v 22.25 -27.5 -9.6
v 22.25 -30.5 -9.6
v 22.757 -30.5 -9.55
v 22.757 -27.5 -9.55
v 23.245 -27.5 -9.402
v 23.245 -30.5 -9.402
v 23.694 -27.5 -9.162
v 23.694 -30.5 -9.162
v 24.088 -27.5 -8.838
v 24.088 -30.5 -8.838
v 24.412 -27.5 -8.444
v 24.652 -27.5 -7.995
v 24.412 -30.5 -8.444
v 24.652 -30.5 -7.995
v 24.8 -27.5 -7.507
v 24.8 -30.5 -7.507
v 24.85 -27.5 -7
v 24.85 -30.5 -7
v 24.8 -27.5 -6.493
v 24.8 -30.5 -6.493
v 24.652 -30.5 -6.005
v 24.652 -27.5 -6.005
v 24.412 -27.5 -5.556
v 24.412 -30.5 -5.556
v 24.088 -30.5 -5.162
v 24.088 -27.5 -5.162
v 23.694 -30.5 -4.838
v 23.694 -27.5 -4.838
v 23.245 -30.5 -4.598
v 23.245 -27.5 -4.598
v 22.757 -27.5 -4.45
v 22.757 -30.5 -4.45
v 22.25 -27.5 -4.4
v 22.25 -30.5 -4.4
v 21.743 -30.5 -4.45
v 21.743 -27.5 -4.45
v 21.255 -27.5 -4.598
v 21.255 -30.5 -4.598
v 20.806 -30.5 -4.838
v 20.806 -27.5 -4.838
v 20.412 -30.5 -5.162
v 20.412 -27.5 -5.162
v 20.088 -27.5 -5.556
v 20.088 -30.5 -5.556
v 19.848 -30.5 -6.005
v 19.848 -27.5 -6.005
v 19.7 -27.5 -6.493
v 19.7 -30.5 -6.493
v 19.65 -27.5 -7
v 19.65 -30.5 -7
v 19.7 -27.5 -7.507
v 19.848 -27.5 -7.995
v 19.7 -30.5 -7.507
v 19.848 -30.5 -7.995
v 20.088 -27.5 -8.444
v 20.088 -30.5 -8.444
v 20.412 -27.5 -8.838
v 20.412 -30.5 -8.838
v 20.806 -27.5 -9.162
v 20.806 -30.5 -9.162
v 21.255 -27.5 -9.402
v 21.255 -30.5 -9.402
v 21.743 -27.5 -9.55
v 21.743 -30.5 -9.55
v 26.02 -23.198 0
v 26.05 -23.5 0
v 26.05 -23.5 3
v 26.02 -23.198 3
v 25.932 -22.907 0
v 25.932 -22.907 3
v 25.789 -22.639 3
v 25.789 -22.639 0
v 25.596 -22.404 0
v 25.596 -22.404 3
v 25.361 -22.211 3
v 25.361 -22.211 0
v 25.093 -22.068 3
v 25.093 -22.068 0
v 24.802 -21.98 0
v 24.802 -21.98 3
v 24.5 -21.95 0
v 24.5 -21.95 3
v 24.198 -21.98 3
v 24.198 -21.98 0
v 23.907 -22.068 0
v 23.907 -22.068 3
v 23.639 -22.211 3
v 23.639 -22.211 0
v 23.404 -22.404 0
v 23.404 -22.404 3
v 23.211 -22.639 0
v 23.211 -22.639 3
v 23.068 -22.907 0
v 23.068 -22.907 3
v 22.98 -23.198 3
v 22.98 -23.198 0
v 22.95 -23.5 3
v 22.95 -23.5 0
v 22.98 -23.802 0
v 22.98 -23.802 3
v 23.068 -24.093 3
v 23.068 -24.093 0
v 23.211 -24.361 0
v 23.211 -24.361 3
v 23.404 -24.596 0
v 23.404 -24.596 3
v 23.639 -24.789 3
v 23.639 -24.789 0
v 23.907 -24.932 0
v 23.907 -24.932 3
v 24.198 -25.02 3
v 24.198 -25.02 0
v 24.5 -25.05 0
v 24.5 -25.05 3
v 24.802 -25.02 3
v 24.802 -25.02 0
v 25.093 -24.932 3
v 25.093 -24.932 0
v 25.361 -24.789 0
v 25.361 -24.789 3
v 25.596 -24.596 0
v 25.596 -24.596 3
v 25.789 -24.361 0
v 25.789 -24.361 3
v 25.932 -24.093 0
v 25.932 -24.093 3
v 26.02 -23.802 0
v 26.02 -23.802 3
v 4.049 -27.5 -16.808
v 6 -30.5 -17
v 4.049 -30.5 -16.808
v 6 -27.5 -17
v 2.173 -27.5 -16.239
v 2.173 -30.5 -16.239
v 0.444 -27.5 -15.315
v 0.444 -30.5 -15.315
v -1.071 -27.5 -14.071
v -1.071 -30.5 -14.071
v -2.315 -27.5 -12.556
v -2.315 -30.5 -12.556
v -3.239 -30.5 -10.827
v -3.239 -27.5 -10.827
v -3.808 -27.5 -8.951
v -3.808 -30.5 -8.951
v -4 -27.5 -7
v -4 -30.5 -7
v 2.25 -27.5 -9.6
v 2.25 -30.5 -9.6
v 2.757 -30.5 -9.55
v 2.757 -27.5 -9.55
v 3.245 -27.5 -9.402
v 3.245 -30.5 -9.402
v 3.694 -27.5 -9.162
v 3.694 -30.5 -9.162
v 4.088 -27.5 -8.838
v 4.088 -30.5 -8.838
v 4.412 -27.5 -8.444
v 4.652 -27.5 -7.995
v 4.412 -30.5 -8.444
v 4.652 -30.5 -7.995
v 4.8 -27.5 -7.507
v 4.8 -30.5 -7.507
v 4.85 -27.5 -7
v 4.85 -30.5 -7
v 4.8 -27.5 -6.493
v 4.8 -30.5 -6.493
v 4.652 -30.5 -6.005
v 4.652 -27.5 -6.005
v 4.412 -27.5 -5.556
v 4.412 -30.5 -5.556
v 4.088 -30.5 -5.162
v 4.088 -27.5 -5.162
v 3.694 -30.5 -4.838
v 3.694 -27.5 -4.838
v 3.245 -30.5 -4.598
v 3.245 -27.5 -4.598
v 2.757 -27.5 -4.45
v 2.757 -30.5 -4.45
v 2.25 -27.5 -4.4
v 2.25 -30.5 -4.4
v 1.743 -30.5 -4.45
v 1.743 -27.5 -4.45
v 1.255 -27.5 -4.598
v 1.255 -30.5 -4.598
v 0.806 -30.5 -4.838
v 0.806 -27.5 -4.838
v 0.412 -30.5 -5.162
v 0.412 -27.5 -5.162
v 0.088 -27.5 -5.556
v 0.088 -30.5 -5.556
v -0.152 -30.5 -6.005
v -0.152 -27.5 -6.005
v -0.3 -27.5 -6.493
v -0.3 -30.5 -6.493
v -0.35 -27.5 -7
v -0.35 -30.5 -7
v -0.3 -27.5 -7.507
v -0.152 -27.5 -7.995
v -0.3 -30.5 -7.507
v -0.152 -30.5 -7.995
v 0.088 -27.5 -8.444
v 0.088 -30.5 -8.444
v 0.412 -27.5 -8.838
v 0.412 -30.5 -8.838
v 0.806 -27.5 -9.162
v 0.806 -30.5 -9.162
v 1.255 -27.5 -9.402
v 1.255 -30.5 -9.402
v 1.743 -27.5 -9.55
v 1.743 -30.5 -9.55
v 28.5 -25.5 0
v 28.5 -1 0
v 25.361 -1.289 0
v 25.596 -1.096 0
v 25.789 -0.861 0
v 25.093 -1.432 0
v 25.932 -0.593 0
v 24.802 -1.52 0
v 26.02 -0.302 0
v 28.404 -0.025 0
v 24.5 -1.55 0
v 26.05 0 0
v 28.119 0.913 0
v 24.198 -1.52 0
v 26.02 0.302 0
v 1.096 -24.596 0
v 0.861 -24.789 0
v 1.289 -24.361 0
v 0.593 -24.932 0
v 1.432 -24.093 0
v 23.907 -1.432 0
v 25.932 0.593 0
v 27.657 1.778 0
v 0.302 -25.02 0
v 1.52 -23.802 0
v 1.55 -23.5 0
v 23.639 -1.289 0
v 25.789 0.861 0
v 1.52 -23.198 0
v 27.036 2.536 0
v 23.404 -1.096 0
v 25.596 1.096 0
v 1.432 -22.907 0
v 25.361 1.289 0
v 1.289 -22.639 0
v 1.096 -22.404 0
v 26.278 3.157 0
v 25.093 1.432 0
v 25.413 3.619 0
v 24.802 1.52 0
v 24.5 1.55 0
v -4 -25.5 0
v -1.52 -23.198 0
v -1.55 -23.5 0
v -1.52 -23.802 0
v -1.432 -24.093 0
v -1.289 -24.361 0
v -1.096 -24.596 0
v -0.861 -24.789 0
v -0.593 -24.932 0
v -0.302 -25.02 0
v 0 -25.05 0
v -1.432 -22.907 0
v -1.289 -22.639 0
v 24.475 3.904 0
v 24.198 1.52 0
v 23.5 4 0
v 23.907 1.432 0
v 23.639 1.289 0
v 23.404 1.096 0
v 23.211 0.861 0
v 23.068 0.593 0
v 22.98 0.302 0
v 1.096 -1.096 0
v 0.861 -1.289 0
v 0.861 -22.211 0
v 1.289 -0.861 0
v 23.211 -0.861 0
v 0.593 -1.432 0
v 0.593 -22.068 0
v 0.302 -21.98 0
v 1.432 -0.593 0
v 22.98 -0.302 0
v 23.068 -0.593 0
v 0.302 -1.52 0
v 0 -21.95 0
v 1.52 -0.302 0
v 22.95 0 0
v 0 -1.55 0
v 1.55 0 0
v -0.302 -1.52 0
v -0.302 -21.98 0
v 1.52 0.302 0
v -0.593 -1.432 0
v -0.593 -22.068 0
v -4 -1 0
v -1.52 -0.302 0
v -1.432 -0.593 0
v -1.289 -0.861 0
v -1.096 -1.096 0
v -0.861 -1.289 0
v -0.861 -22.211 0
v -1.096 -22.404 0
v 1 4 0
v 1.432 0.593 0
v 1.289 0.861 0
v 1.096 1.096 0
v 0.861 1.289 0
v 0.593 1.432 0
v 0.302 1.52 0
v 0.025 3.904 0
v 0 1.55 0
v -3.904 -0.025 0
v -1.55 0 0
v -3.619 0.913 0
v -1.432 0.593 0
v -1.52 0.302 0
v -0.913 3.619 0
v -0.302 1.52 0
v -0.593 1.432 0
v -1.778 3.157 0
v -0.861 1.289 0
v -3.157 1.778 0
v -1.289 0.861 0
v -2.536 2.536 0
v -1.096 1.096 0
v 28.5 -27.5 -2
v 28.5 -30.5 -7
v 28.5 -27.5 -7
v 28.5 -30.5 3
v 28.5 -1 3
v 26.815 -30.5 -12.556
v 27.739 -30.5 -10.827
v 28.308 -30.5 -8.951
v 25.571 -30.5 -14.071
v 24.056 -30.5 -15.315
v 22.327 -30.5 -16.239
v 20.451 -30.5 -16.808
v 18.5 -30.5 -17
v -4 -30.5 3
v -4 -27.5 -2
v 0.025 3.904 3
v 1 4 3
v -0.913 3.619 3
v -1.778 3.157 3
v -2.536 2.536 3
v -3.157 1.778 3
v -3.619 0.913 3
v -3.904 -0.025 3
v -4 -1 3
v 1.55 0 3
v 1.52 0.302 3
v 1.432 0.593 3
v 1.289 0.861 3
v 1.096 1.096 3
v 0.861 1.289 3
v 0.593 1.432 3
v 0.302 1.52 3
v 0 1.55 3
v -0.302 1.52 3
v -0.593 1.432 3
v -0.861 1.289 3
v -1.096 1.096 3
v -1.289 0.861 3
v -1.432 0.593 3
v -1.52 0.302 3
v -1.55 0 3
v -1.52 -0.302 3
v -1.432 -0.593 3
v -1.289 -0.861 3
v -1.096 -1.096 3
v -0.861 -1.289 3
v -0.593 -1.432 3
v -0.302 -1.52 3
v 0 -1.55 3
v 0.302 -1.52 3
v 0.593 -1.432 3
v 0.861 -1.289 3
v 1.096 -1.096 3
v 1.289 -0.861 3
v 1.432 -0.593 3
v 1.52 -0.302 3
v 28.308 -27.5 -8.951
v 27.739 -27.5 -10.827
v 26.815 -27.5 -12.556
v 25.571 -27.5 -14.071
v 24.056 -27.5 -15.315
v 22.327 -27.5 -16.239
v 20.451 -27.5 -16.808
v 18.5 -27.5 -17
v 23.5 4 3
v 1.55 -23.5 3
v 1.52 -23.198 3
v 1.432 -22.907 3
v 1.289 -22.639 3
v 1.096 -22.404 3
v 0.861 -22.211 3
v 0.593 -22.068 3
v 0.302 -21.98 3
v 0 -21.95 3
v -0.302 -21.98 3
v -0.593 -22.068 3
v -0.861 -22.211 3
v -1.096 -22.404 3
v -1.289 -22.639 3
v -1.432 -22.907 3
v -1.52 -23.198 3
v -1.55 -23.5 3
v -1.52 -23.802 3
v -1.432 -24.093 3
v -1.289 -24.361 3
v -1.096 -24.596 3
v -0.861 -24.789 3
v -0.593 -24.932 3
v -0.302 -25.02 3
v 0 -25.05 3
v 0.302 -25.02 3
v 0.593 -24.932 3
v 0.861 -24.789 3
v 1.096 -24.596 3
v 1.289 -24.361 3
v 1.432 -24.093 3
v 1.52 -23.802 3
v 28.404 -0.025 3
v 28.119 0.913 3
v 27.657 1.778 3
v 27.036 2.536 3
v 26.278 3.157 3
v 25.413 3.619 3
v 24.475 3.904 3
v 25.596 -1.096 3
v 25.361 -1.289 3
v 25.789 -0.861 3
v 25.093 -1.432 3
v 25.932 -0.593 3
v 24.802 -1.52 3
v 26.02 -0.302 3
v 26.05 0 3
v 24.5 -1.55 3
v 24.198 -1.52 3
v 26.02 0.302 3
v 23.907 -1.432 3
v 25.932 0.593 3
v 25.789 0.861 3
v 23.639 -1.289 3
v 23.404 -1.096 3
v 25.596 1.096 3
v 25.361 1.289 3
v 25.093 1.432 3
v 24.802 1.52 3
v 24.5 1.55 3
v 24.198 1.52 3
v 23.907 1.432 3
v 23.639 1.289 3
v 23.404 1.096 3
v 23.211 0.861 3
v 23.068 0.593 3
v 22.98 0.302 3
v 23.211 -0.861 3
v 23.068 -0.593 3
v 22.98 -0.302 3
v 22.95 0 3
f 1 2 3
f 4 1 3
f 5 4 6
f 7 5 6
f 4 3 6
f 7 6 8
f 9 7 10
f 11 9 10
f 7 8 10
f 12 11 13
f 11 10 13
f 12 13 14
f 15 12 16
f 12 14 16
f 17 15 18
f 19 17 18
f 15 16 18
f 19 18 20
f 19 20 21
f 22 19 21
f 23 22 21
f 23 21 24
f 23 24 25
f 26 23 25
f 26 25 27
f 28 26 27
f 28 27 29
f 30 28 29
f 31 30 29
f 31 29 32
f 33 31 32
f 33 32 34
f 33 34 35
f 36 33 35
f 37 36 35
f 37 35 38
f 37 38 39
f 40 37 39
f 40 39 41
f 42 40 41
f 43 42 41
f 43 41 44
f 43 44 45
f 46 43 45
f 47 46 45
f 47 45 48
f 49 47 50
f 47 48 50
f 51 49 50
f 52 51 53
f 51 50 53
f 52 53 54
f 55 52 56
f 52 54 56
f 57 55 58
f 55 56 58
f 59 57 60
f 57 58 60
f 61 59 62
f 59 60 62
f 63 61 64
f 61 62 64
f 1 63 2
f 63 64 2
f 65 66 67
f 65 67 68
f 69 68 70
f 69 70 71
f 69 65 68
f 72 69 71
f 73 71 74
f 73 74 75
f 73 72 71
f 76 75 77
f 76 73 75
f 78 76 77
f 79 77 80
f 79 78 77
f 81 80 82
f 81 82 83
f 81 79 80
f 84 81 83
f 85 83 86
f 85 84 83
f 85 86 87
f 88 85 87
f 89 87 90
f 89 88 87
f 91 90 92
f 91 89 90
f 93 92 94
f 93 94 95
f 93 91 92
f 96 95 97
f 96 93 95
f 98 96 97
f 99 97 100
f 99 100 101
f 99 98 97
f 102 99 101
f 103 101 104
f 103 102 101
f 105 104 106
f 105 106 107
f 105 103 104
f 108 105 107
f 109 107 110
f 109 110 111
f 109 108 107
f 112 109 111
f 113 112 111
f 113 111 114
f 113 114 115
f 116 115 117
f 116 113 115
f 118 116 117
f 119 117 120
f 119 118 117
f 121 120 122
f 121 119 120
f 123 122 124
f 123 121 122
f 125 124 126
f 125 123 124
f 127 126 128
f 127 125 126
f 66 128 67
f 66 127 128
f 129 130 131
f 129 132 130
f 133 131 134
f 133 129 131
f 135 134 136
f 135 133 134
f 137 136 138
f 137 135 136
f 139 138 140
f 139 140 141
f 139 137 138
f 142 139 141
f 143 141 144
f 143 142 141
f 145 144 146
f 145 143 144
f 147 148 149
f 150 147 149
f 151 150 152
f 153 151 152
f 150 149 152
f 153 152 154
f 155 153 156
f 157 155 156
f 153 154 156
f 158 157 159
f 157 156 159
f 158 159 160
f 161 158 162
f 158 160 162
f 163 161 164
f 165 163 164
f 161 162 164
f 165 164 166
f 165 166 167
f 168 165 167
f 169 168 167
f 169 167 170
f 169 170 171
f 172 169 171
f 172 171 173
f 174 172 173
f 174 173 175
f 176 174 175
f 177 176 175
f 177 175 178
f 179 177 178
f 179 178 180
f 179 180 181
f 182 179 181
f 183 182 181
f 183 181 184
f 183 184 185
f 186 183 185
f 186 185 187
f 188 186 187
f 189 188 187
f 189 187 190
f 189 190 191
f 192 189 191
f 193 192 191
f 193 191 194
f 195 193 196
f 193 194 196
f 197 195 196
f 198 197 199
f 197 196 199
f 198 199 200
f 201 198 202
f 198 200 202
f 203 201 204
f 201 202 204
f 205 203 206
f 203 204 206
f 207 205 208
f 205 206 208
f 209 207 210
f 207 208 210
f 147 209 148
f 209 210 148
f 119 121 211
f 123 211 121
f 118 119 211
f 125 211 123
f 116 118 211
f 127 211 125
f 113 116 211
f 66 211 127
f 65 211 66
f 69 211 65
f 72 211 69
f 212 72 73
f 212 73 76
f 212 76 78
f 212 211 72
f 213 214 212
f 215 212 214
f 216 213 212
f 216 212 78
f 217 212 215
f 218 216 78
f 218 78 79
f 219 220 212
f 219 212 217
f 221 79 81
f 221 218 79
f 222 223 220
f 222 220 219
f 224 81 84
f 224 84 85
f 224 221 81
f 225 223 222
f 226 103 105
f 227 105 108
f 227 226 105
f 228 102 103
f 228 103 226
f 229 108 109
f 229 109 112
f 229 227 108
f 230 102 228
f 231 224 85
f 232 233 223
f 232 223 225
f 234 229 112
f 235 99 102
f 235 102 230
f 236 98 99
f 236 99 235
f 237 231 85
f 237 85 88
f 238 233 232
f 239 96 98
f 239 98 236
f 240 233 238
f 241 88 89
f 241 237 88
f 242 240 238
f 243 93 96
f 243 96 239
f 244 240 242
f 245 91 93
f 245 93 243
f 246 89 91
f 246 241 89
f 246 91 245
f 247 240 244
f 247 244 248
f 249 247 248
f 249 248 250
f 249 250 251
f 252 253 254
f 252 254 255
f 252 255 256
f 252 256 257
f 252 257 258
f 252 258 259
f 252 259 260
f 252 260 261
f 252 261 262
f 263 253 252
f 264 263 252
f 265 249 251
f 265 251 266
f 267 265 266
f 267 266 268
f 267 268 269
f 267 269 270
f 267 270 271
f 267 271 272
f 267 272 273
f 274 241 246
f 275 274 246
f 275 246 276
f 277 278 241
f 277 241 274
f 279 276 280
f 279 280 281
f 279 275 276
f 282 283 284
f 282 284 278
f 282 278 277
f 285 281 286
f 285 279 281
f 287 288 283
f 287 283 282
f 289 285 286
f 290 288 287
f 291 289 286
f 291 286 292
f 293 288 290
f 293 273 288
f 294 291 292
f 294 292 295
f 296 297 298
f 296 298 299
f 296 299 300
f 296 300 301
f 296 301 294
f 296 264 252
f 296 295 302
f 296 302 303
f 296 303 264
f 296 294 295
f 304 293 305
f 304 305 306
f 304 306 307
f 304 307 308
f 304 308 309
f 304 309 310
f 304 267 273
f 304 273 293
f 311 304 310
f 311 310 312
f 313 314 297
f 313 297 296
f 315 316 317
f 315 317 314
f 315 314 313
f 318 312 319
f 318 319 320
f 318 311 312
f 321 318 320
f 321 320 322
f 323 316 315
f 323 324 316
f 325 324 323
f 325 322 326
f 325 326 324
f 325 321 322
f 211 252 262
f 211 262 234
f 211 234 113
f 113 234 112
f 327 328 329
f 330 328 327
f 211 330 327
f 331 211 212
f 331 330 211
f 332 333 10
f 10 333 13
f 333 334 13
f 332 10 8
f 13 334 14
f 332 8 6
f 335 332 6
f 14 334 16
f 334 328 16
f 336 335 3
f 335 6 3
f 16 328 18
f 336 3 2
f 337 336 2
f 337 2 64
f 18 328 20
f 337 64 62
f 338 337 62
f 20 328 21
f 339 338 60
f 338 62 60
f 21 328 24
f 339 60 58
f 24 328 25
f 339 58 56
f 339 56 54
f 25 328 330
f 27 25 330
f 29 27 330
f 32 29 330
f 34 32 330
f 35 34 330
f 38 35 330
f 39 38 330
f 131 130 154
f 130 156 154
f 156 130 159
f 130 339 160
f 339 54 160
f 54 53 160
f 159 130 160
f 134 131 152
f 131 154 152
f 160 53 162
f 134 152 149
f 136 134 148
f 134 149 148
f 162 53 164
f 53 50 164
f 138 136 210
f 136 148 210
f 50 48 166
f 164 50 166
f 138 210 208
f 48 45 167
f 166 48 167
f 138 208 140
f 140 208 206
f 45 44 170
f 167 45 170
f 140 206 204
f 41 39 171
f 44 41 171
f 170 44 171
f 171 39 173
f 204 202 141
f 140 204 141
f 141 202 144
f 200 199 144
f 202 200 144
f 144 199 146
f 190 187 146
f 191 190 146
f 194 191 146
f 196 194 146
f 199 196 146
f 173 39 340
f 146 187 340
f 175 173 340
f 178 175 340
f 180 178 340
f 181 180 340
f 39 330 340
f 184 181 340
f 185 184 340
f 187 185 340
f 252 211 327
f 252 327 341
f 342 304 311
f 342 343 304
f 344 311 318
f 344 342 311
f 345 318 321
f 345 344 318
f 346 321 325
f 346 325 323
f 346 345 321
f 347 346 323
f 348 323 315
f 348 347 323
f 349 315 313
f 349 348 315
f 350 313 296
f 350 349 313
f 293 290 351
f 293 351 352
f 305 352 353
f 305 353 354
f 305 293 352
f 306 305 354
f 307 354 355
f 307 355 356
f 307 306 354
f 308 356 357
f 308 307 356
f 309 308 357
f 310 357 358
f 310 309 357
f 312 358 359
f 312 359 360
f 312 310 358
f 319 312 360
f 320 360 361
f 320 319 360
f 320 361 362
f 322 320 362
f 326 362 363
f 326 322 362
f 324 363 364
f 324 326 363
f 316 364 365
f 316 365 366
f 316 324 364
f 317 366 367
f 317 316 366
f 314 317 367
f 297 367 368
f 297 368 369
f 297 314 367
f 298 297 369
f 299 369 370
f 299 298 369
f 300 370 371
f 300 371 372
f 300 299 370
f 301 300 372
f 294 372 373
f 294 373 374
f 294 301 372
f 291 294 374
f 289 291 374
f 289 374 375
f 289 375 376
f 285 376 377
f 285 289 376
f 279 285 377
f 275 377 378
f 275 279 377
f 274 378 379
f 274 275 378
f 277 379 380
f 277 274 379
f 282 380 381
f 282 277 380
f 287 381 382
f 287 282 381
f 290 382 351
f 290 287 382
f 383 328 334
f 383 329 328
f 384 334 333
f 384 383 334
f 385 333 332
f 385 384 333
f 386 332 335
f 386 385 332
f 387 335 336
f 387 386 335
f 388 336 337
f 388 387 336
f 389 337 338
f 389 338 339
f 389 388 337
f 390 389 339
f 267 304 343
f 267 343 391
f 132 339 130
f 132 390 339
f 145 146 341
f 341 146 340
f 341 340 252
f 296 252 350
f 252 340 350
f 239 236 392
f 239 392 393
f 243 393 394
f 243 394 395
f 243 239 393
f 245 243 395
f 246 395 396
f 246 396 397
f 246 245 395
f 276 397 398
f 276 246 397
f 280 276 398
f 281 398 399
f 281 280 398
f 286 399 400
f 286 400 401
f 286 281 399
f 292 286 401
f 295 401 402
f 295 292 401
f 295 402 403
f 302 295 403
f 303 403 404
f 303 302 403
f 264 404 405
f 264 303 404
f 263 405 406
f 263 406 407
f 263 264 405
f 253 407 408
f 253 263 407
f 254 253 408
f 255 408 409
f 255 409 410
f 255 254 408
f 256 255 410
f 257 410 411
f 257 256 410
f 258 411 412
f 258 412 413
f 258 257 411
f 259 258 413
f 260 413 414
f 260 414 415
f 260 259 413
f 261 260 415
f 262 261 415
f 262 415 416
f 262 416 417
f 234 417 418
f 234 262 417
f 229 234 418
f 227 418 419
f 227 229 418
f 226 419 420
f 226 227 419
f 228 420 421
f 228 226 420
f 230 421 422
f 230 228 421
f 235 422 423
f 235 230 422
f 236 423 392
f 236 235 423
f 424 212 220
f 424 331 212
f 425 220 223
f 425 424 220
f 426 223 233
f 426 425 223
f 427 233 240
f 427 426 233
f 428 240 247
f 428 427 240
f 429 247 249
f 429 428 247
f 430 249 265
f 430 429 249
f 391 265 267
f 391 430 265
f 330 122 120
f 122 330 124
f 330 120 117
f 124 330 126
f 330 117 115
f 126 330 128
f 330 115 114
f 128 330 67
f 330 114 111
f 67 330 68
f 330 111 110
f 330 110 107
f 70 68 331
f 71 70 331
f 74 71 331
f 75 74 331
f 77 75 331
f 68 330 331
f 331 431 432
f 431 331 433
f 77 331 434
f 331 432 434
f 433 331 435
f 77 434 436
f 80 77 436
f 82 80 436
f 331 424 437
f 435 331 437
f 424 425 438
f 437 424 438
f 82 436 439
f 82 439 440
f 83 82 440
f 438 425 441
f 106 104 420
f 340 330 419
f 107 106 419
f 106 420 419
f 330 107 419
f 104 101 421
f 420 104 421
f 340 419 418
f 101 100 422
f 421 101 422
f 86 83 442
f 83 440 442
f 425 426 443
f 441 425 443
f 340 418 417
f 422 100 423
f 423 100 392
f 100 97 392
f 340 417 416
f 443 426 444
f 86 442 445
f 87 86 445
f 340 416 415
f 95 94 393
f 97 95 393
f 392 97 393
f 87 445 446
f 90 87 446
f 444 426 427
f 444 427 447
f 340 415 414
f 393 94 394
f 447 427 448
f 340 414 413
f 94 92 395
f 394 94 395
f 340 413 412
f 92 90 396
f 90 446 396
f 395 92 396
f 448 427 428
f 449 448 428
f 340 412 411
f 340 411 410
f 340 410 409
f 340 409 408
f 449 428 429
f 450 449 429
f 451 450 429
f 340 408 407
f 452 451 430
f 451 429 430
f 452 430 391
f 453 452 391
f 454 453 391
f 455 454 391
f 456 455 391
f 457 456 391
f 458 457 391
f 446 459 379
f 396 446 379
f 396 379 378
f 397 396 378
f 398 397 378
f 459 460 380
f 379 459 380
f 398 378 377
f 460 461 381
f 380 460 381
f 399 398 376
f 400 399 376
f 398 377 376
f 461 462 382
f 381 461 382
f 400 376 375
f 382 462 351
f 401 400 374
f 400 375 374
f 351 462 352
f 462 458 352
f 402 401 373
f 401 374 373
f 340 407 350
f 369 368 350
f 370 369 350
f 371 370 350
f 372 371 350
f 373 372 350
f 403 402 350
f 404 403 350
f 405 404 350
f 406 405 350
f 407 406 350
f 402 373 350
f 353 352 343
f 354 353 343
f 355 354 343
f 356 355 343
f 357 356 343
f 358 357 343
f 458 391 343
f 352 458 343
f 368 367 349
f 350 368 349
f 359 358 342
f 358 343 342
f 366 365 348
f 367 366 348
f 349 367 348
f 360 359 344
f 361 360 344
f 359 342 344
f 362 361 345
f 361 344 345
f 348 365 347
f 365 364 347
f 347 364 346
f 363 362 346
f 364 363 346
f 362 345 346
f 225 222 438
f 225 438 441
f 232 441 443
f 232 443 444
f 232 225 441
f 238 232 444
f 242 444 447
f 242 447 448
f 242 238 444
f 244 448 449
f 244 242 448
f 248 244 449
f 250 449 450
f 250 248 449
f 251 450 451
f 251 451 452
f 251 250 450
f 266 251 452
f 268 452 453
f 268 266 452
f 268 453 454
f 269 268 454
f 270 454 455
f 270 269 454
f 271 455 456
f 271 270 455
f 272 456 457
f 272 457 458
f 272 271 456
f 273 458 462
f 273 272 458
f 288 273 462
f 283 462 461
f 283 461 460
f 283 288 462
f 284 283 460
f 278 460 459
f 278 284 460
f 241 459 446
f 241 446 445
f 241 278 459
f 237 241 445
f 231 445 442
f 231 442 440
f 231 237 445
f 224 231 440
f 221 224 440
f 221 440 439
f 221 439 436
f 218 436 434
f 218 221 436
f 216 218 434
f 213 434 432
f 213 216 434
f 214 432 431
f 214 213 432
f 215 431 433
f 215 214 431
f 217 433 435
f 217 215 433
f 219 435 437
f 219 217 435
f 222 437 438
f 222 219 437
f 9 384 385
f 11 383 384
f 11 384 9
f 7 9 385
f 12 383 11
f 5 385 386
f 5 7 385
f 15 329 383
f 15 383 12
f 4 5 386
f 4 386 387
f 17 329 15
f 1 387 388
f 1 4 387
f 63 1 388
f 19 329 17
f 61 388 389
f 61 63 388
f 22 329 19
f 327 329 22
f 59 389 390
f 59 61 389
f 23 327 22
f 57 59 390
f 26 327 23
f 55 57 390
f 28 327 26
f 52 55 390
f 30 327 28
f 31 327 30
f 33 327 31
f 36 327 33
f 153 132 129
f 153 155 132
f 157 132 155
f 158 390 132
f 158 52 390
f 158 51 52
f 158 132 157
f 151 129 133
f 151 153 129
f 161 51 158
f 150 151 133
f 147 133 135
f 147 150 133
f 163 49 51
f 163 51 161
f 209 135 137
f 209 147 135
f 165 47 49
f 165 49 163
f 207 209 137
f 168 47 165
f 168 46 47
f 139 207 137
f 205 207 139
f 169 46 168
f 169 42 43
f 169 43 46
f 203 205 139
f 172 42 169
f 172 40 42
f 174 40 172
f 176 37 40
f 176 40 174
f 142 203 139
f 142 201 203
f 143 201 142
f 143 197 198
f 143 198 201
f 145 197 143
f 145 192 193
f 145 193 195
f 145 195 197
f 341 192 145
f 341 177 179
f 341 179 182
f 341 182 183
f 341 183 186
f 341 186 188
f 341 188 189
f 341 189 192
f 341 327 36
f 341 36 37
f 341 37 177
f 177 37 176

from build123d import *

# Parameters (mm, degrees)
SKETCH_1_R          = 1.55
EXTRUDE_1_DEPTH     = 3
SKETCH_2_W          = 32.5
SKETCH_2_H          = 3
EXTRUDE_2_DEPTH     = 17
SKETCH_3_R          = 2.6
CUT_EXTRUDE_1_DEPTH = 17
CHAMFER_1_SIZE      = 2
FILLET_1_R          = 10
FILLET_2_R          = 5


with BuildPart() as part:
    # 草图1 → 凸台-拉伸1 (new body)
    with BuildSketch(Plane.XY):
        Polygon((28.5, -27.5), (28.5, -30.5), (-4, -30.5), (-4, -27.5), (-4, 4), (28.5, 4), align=None)
        Circle(SKETCH_1_R, mode=Mode.SUBTRACT)
        with Locations((24.5, 0)):
            Circle(SKETCH_1_R, mode=Mode.SUBTRACT)
        with Locations((0, -23.5)):
            Circle(SKETCH_1_R, mode=Mode.SUBTRACT)
        with Locations((24.5, -23.5)):
            Circle(SKETCH_1_R, mode=Mode.SUBTRACT)
    extrude(amount=EXTRUDE_1_DEPTH)

    # 草图2 → 凸台-拉伸2 (add)
    with BuildSketch(Plane(origin=(0, 0, 0), x_dir=(-1, 0, 0), z_dir=(0, 0, -1))):
        with Locations((-12.25, -29)):
            Rectangle(SKETCH_2_W, SKETCH_2_H)
    extrude(amount=EXTRUDE_2_DEPTH)

    # 草图3 → 切除-拉伸1 (cut)
    with BuildSketch(Plane.XZ.offset(30.5)):
        with Locations(Location((22.25, -7, 0), (0, 0, 270))):
            Circle(SKETCH_3_R)
        with Locations(Location((2.25, -7, 0), (0, 0, 270))):
            Circle(SKETCH_3_R)
    extrude(amount=-CUT_EXTRUDE_1_DEPTH, mode=Mode.SUBTRACT)

    # 倒角1
    chamfer_1_edges = [part.edges().sort_by_distance(p)[0] for p in [
        (12.25, -27.5, 0),
    ]]
    chamfer(chamfer_1_edges, length=CHAMFER_1_SIZE)

    # 圆角1
    fillet_1_edges = [part.edges().sort_by_distance(p)[0] for p in [
        (28.5, -29, -17),
        (-4, -29, -17),
    ]]
    fillet(fillet_1_edges, radius=FILLET_1_R)

    # 圆角2
    fillet_2_edges = [part.edges().sort_by_distance(p)[0] for p in [
        (-4, 4, 1.5),
        (28.5, 4, 1.5),
    ]]
    fillet(fillet_2_edges, radius=FILLET_2_R)


solid = part.part
